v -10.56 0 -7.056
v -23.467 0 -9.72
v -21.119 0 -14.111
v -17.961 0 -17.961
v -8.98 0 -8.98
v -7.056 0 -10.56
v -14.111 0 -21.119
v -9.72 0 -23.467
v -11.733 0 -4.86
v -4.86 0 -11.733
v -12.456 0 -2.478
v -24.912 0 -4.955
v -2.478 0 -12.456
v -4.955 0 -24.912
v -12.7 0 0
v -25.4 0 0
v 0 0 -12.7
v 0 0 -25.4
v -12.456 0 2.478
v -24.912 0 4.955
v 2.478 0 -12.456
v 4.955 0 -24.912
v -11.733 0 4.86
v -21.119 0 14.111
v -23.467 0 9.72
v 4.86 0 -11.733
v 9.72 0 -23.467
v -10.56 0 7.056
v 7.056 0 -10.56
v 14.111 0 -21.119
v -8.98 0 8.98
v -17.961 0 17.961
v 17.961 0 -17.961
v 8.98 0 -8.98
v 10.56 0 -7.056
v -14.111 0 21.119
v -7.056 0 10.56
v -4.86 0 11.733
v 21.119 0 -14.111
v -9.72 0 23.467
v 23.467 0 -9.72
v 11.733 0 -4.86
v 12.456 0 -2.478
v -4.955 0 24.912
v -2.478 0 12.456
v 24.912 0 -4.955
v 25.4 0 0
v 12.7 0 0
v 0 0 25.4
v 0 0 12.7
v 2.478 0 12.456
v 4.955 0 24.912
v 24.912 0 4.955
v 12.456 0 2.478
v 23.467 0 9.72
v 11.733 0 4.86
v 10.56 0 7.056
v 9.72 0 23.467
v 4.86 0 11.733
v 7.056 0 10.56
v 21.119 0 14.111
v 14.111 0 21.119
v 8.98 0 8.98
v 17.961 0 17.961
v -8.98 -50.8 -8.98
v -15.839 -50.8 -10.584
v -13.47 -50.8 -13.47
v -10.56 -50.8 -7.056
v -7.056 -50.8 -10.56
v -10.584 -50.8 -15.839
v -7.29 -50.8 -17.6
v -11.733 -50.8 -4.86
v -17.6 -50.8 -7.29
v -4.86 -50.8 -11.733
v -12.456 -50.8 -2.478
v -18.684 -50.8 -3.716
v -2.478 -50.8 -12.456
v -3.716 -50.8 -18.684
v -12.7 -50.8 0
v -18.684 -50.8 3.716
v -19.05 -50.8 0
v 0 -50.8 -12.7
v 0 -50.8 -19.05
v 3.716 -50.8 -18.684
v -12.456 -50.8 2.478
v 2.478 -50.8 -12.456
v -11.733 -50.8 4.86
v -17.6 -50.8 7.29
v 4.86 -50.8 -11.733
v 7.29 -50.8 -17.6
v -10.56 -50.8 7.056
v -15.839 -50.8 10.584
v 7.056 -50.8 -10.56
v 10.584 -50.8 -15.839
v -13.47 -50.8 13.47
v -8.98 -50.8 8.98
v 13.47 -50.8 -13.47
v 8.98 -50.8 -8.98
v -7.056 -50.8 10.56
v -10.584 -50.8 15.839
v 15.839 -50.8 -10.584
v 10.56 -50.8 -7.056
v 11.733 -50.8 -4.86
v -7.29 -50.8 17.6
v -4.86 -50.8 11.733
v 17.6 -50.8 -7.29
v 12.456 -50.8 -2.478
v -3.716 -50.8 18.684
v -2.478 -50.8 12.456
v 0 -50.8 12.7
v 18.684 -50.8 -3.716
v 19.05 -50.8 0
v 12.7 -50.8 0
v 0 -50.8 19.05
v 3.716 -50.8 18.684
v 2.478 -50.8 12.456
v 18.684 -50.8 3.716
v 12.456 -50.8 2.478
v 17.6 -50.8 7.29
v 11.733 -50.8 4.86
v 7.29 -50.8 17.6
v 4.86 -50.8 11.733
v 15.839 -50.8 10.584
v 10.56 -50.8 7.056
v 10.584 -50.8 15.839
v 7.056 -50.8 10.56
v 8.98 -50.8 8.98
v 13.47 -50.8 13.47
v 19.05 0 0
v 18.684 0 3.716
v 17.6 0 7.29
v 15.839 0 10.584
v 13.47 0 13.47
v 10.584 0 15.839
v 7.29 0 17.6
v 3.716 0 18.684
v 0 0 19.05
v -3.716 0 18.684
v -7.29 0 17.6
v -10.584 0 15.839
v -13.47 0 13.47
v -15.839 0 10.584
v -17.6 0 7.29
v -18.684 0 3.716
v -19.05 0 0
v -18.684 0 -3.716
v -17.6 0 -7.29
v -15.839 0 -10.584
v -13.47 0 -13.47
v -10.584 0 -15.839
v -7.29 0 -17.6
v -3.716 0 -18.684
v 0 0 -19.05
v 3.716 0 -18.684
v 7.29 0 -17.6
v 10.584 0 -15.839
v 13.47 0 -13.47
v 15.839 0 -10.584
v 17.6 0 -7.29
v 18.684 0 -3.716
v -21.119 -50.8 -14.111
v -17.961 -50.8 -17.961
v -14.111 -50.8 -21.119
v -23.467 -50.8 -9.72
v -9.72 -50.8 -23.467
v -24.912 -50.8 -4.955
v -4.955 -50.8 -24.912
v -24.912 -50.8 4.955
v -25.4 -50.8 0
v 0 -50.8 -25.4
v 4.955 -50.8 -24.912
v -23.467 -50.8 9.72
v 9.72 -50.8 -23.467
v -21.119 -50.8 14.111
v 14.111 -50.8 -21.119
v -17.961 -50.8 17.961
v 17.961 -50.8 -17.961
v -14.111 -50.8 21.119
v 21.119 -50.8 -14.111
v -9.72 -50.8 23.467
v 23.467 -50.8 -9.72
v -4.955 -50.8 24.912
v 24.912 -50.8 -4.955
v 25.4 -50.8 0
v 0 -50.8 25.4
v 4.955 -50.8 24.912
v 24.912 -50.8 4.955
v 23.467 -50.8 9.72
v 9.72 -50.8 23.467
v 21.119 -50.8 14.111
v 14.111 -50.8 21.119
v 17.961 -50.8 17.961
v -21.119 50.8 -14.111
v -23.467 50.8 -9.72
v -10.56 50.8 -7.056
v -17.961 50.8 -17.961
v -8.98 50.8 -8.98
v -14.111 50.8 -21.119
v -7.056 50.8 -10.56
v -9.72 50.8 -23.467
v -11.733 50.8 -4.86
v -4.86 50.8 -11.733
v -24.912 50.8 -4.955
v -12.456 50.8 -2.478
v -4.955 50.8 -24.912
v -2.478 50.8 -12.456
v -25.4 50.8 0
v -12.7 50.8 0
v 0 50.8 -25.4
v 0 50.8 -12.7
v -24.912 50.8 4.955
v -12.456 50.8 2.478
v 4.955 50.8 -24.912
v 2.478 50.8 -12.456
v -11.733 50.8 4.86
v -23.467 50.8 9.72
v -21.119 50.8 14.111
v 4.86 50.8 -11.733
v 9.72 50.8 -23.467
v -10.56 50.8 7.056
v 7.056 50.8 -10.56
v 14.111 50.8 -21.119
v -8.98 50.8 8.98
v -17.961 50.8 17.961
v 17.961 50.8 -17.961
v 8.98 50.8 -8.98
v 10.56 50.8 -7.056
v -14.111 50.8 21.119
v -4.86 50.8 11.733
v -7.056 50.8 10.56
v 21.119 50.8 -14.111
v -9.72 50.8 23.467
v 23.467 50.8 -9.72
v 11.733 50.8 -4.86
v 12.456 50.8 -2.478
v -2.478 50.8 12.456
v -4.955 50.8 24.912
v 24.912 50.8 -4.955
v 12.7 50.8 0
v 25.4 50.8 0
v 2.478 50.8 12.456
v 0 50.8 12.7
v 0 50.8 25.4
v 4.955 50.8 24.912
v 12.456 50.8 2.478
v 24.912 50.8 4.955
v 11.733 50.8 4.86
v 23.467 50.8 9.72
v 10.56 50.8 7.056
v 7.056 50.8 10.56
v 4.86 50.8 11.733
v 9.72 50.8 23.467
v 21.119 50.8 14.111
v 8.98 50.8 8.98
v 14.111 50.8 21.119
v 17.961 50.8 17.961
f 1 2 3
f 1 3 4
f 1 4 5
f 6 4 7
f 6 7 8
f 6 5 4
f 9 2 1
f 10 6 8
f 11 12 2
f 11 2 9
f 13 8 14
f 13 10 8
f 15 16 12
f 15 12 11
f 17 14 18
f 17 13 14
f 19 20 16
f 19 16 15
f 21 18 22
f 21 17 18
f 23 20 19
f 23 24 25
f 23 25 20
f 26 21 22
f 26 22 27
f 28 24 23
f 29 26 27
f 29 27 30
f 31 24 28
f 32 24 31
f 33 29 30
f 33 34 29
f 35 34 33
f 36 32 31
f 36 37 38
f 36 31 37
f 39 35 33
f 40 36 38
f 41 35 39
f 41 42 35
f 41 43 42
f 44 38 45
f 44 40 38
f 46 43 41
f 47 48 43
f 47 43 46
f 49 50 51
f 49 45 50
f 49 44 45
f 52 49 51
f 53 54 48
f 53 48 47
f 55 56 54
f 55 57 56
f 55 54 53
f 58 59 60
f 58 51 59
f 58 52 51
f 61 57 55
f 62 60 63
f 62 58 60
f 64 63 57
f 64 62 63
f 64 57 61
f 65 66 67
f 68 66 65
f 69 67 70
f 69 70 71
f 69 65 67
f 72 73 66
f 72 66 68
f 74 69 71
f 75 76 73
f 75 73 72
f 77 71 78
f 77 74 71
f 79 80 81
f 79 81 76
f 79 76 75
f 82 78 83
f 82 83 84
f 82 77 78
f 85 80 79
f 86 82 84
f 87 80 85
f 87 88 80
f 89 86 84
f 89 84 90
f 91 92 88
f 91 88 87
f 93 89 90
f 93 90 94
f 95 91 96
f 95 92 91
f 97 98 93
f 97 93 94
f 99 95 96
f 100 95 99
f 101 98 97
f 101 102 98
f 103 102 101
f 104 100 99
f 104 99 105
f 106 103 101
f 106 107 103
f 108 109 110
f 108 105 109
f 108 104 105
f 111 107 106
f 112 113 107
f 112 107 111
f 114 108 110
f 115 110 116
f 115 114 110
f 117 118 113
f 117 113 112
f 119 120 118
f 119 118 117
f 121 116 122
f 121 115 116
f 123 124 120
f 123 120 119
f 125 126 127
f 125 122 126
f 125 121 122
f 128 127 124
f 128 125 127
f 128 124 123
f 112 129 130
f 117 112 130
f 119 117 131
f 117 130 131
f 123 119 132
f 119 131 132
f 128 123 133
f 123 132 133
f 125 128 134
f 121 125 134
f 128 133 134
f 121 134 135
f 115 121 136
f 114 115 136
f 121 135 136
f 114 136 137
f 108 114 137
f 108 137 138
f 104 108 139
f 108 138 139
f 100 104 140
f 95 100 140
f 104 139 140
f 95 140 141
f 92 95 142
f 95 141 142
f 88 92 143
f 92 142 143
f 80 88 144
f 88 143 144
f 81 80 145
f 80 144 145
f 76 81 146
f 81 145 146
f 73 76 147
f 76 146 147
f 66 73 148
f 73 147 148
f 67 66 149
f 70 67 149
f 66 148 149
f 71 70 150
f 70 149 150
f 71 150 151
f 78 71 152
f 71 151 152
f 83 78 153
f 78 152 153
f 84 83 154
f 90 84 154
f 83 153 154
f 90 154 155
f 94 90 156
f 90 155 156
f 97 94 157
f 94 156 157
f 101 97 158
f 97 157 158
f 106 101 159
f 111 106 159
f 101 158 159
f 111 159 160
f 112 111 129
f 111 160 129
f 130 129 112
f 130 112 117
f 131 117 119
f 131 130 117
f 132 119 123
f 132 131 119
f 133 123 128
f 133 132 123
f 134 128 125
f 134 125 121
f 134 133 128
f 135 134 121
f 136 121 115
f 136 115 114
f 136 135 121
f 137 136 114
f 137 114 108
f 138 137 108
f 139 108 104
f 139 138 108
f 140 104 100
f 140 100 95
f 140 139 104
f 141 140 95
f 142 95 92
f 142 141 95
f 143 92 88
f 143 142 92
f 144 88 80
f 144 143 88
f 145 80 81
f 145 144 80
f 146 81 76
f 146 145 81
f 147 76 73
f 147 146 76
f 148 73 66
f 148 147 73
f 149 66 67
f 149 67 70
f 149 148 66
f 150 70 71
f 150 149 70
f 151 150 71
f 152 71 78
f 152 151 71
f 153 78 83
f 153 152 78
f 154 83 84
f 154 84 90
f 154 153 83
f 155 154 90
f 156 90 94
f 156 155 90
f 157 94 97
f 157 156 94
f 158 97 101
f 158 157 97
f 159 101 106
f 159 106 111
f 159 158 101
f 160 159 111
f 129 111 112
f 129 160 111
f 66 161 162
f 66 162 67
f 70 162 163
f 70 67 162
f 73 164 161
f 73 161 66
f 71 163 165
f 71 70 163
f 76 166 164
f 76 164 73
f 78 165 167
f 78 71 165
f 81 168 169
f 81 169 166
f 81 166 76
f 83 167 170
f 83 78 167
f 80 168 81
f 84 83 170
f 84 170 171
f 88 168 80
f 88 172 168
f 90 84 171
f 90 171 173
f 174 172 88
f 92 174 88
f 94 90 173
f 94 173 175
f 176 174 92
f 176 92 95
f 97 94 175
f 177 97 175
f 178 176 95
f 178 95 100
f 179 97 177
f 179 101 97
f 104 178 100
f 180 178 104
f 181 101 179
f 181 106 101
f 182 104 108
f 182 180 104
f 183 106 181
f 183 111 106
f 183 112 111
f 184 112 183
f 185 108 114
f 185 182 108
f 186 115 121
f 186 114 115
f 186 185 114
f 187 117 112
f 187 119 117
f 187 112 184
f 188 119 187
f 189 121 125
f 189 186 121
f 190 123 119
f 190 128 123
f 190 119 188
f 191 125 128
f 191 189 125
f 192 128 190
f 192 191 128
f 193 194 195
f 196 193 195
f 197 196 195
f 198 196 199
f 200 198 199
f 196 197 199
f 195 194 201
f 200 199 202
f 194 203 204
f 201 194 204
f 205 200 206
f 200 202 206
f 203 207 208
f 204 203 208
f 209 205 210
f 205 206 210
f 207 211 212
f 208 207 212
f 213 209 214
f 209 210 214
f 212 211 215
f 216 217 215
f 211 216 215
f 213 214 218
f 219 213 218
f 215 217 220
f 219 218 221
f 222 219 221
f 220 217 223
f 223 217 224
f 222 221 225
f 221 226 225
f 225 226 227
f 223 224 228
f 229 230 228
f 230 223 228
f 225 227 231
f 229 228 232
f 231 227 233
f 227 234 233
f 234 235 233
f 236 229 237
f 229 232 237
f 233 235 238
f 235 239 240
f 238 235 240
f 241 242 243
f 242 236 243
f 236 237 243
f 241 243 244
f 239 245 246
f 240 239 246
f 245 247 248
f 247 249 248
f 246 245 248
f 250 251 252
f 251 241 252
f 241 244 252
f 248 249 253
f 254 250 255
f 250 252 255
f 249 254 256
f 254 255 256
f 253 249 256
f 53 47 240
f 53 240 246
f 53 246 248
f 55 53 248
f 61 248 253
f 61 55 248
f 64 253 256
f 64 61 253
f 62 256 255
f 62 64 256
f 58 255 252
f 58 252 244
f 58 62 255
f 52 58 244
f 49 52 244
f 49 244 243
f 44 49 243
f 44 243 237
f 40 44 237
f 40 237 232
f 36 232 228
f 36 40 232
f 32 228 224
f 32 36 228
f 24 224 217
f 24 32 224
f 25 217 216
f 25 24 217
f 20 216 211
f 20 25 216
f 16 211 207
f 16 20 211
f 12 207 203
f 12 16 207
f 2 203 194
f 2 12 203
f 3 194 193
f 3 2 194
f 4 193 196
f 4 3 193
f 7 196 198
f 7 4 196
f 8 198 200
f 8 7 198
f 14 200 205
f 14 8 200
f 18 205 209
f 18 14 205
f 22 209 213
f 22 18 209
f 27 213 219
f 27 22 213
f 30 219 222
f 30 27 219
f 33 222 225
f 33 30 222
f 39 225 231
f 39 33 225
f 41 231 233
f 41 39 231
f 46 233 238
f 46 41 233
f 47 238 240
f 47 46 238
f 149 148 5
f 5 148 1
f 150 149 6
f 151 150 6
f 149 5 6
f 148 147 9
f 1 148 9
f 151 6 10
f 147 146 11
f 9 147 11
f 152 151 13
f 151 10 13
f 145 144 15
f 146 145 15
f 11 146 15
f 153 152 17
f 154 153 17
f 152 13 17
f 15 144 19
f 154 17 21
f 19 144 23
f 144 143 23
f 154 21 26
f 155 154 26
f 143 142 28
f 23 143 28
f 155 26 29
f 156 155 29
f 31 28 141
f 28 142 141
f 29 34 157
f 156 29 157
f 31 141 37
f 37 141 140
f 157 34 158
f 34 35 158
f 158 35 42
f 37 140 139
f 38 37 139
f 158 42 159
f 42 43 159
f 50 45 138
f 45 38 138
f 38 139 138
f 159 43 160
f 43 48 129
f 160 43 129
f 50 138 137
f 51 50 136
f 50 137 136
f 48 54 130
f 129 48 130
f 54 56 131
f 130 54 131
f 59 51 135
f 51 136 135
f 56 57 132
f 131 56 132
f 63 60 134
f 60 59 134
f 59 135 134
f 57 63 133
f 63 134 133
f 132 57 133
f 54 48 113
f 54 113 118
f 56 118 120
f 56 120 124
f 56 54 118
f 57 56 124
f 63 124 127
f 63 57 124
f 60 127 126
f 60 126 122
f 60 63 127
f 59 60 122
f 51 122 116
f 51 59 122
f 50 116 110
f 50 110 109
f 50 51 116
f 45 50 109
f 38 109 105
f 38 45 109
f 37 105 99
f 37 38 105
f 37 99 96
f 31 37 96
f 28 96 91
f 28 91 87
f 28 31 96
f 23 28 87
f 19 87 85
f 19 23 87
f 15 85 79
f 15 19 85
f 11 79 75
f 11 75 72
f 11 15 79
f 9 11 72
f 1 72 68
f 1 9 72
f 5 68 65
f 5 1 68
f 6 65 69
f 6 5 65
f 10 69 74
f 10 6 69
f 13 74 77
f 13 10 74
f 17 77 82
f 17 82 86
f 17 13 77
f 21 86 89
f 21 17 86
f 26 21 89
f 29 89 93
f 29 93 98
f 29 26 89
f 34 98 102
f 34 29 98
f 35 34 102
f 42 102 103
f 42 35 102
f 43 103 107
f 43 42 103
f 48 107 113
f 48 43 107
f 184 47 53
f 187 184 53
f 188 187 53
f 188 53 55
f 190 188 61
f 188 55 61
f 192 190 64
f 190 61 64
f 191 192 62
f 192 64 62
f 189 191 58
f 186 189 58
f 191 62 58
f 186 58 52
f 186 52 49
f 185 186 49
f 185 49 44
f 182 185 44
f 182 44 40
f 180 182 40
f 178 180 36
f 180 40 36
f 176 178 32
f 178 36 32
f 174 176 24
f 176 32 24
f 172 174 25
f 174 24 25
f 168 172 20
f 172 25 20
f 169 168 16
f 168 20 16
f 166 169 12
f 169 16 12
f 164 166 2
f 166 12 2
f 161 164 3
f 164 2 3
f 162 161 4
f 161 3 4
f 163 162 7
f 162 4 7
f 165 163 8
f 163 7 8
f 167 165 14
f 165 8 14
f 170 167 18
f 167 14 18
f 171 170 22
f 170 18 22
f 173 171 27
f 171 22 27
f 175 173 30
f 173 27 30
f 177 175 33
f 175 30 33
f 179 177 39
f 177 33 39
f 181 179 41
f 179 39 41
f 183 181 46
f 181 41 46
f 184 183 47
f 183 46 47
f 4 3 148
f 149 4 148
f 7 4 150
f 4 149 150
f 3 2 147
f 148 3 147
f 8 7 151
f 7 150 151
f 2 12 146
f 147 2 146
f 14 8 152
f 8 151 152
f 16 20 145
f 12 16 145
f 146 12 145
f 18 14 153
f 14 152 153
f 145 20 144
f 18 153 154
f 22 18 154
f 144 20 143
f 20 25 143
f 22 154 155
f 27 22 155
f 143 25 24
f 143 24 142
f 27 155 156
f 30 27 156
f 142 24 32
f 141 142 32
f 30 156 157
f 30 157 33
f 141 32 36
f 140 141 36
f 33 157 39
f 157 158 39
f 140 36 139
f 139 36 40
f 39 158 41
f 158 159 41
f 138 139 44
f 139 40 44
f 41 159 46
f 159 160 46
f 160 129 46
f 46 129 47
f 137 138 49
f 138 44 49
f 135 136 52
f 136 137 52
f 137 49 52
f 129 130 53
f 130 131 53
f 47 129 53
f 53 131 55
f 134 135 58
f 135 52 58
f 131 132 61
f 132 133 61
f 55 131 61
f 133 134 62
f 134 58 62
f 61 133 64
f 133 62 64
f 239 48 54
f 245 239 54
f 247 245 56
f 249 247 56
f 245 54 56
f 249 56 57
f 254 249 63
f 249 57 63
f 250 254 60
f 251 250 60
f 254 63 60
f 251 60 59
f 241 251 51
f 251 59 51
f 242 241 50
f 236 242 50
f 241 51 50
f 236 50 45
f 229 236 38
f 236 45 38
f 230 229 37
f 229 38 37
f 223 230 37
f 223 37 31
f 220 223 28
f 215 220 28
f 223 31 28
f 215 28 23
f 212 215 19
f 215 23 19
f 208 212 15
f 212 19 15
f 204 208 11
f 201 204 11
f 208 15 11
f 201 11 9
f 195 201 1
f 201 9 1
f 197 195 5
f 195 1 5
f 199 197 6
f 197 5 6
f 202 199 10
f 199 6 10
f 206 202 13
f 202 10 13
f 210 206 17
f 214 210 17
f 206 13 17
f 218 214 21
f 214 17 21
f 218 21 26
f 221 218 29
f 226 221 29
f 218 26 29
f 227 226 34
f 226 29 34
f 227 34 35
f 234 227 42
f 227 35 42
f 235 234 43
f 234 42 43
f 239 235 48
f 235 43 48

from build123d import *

# Parameters (mm, degrees)
F0_R     = 25.4
F0_R_2   = 19.05
F1_DEPTH = 50.8
F0_R_3   = 12.7
F2_DEPTH = 50.8
F3_DEPTH = 50.8


with BuildPart() as f1:
    # F0 (on Front) → F1 (new body)
    with BuildSketch(Plane.XZ):
        Circle(F0_R)
        Circle(F0_R_2, mode=Mode.SUBTRACT)
    extrude(amount=F1_DEPTH)


with BuildPart() as f2:
    # F0 (on Front) → F2 (new body)
    with BuildSketch(Plane.XZ):
        Circle(F0_R_2)
        Circle(F0_R_3, mode=Mode.SUBTRACT)
    extrude(amount=F2_DEPTH)


with BuildPart() as f3:
    # F0 (on Front) → F3 (new body)
    with BuildSketch(Plane.XZ):
        Circle(F0_R)
        Circle(F0_R_2, mode=Mode.SUBTRACT)
        Circle(F0_R_2)
        Circle(F0_R_3, mode=Mode.SUBTRACT)
    extrude(amount=-F3_DEPTH)


solid = Compound([f1.part, f2.part, f3.part])
